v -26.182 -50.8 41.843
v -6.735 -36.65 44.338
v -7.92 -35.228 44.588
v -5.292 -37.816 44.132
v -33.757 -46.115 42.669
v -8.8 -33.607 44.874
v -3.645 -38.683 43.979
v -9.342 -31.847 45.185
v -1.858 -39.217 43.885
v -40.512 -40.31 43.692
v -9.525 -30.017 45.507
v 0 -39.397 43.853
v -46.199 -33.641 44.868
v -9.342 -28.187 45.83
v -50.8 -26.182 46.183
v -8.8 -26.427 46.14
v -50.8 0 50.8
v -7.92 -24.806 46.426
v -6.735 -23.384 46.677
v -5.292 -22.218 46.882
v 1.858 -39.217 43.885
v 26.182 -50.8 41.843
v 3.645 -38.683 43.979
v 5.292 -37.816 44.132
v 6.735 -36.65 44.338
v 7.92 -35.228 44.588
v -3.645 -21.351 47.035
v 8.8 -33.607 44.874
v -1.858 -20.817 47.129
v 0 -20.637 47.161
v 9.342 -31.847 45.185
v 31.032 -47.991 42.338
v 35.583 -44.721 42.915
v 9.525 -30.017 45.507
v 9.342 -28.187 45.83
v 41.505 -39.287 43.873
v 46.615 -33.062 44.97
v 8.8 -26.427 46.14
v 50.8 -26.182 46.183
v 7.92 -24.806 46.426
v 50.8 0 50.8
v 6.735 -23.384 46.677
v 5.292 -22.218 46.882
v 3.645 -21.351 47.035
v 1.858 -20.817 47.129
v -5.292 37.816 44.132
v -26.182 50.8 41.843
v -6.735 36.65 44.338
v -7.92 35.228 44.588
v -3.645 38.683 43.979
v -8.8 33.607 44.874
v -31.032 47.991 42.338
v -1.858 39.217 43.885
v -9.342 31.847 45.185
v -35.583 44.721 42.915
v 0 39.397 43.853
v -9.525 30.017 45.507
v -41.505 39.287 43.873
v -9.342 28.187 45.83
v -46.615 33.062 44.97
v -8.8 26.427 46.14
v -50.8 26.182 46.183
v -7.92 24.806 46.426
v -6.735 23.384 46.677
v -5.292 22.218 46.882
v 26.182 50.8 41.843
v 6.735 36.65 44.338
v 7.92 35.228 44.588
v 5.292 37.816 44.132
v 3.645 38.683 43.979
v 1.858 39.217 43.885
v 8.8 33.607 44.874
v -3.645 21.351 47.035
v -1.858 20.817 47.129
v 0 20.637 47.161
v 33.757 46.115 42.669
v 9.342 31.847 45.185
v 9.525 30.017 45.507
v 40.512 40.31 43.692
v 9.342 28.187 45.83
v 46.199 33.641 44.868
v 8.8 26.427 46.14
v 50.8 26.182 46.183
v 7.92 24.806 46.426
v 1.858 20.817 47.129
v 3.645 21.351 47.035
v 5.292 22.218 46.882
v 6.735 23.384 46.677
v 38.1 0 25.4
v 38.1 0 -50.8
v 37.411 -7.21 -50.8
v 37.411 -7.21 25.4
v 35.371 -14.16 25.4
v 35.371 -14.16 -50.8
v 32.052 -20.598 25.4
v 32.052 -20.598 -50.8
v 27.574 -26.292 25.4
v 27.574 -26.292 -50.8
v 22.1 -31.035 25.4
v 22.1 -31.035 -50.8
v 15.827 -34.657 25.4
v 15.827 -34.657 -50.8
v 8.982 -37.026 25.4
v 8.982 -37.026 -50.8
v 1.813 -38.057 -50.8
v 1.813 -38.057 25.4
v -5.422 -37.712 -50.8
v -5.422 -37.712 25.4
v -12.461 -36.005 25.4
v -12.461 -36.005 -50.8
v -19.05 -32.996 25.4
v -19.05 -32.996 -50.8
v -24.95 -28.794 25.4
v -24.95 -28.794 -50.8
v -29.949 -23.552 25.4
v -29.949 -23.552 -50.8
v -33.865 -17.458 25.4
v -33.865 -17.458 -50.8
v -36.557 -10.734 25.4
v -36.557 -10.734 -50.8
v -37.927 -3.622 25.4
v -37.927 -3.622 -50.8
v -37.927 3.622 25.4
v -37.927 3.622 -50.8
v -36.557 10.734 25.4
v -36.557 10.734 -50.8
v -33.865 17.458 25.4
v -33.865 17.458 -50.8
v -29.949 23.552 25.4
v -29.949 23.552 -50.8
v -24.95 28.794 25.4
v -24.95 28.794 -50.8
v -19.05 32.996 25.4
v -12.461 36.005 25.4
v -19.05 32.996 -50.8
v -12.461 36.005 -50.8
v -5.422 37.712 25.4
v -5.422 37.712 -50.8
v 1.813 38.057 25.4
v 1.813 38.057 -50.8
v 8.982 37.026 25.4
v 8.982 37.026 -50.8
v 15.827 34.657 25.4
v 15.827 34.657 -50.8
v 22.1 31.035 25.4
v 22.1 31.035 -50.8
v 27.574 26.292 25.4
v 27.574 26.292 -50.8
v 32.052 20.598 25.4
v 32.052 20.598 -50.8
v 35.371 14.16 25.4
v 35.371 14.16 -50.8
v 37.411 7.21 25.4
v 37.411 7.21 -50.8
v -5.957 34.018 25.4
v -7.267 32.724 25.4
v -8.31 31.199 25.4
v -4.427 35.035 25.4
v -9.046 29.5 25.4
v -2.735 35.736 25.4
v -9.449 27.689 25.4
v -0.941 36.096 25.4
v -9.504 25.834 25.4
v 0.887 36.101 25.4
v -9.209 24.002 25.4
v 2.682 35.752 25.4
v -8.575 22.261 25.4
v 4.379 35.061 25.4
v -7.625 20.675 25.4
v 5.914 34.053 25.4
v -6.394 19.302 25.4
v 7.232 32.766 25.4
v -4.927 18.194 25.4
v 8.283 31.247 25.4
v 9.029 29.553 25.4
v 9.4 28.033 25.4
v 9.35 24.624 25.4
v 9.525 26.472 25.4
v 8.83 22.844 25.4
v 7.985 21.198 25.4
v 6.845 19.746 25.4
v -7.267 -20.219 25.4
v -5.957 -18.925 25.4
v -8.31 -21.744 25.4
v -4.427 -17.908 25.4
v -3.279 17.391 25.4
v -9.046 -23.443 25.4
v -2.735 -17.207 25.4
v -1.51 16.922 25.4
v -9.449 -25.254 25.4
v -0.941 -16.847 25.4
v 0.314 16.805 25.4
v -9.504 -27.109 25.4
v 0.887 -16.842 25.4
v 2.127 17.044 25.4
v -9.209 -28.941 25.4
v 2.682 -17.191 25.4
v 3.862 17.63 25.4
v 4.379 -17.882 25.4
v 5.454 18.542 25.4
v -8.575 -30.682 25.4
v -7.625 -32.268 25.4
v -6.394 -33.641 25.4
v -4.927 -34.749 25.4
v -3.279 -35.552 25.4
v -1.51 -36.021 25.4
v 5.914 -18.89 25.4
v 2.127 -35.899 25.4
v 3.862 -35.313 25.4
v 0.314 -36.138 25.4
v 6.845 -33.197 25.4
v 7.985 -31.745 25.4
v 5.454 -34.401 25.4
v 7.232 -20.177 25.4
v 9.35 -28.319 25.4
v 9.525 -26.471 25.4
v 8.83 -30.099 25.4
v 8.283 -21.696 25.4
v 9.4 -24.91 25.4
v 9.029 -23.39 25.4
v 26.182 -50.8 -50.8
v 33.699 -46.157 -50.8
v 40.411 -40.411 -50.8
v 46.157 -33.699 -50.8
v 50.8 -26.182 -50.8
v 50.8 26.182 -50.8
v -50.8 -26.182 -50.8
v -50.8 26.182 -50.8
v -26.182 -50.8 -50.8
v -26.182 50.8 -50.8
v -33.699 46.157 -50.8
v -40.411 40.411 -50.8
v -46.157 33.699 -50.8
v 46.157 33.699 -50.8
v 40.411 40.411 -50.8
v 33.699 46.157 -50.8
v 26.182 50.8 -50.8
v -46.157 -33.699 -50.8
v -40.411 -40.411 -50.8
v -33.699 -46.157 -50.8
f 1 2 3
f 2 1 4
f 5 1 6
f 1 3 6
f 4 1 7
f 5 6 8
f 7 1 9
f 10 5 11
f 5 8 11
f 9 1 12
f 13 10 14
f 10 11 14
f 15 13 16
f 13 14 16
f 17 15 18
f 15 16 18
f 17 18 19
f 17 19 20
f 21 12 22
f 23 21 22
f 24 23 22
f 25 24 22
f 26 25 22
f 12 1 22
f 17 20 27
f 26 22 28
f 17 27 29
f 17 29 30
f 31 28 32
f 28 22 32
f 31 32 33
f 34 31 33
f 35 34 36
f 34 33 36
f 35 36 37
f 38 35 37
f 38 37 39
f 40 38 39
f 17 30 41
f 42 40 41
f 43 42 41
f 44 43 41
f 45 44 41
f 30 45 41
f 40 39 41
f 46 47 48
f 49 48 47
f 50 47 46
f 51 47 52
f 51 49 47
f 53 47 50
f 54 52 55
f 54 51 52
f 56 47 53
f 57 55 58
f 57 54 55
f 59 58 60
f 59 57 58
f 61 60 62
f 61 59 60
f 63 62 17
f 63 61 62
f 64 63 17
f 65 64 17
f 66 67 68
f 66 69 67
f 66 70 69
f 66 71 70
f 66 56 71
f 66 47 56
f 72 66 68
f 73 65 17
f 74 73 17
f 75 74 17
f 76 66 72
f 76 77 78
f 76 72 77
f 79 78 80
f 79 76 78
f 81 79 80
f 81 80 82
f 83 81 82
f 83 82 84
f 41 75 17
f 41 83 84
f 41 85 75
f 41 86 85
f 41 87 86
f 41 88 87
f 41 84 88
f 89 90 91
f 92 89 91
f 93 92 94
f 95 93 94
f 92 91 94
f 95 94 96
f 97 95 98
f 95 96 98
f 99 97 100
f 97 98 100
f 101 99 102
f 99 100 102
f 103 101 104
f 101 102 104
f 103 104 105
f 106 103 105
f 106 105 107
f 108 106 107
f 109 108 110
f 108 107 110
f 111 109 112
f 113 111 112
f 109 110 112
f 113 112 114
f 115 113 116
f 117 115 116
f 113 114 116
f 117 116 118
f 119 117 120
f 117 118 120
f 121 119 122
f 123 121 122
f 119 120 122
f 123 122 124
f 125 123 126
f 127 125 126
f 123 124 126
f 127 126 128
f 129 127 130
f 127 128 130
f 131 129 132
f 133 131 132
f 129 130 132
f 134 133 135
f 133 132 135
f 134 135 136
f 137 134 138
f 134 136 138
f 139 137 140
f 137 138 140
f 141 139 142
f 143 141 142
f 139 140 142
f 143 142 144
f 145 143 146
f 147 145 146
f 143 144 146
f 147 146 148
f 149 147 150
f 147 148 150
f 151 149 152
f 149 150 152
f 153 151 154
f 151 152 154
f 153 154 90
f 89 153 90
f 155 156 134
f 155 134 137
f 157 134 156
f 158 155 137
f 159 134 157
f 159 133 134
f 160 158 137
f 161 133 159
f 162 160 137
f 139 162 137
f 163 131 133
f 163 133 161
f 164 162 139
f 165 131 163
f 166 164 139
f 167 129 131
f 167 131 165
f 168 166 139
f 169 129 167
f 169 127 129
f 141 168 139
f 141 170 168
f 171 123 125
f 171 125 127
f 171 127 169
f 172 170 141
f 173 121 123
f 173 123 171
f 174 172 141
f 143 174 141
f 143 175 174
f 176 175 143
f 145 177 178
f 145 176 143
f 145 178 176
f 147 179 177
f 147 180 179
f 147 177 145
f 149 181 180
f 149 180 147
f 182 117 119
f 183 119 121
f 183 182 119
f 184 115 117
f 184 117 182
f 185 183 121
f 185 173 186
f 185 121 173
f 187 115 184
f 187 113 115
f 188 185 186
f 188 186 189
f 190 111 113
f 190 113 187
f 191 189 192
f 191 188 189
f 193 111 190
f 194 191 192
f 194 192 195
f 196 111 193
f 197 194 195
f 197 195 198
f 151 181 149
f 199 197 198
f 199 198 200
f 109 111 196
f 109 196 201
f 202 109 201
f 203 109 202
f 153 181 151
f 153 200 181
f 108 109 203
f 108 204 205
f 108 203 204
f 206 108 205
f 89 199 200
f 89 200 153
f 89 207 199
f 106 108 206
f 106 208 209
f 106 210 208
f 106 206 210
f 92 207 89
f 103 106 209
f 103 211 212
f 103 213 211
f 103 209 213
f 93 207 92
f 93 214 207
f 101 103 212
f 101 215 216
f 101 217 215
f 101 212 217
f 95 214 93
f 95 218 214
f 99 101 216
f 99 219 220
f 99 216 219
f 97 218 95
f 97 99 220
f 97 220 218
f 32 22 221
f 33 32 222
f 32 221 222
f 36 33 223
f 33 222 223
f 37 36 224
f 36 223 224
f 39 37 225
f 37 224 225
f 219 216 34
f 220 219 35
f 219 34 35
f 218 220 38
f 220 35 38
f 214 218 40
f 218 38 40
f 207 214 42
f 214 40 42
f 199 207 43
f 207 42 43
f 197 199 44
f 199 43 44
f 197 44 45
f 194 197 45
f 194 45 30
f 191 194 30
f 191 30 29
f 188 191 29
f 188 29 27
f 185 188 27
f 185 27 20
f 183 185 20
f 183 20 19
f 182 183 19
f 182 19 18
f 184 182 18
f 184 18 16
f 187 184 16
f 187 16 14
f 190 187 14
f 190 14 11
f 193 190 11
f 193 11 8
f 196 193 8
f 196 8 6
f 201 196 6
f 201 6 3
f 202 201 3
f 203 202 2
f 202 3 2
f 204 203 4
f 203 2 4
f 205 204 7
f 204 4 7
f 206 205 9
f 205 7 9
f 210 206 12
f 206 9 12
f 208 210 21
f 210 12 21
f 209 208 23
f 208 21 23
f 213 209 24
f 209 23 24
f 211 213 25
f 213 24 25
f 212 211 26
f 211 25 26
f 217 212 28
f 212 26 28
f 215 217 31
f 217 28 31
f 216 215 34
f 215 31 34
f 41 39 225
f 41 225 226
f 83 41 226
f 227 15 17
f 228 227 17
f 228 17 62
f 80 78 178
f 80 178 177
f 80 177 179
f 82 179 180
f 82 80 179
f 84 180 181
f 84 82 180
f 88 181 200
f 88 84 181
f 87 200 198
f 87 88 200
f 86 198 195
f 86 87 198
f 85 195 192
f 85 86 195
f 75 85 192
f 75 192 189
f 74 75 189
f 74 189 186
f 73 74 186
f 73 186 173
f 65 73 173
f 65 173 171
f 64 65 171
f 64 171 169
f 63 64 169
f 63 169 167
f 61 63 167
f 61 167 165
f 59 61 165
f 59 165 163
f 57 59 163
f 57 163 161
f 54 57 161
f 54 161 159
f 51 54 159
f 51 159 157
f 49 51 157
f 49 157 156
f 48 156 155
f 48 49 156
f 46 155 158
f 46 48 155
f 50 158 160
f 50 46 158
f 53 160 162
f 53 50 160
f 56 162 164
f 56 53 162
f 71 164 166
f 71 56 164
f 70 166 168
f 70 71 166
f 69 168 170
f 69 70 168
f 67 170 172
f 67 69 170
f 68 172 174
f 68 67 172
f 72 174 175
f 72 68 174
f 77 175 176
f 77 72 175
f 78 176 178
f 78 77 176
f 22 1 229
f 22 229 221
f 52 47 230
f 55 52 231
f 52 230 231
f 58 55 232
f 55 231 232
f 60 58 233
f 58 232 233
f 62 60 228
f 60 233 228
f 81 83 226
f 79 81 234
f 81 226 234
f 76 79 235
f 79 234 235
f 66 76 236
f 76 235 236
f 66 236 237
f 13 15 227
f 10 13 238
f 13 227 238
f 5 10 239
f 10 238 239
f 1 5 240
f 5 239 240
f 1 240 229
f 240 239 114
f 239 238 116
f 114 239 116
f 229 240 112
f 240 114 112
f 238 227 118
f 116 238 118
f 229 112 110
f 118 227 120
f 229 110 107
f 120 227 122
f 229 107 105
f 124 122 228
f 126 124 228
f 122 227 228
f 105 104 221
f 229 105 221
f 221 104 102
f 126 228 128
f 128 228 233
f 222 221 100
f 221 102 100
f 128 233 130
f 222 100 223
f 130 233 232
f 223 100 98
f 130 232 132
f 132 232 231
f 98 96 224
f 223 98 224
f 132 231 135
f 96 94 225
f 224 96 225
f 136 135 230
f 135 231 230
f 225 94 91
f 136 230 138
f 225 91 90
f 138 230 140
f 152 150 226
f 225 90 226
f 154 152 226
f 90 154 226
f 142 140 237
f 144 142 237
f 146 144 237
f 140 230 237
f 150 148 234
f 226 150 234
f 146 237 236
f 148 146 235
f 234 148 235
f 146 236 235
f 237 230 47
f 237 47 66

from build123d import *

# Parameters (mm, degrees)
F0_W     = 101.6
F0_H     = 101.6
F1_DEPTH = 50.8
F2_R     = 38.1
F3_DEPTH = 76.2
F5_DEPTH = 50.8
F6_R     = 9.525
F7_DEPTH = 25.4
F9_DEPTH = 127


# Not quite as in the source:
# - a pattern or mirror of a feature is missing from the dataset's text; its kind, count and spacing are read off the source's solid


with BuildPart() as f1:
    # F0 (on Top) → F1 (new body, symmetric)
    with BuildSketch(Plane.XY):
        Rectangle(F0_W, F0_H)
    extrude(amount=F1_DEPTH, both=True)

    # F2 (on face) → F3 (cut)
    with BuildSketch(Plane(origin=(0, 0, -50.8), x_dir=(1, 0, 0), z_dir=(0, 0, -1))):
        Circle(F2_R)
    extrude(amount=-F3_DEPTH, mode=Mode.SUBTRACT)

    # F4 (on Right) → F5 (cut, symmetric)
    with BuildSketch(Plane.YZ):
        Polygon((-50.8, 41.84258938), (0, 50.8), (-50.8, 50.8), align=None)
    f5 = extrude(amount=F5_DEPTH, both=True, mode=Mode.SUBTRACT)

    # F5_copies: F5 across plane
    add(f5.mirror(Plane.ZX), mode=Mode.SUBTRACT)

    # F6 (on face) → F7 (cut)
    with BuildSketch(Plane(origin=(0, -8.6873116405, 49.268192568), x_dir=(1, 0, 0), z_dir=(0, -0.1736481777, 0.984807753))):
        with Locations((0, -21.6586725745)):
            Circle(F6_R)
    f7 = extrude(amount=-F7_DEPTH, mode=Mode.SUBTRACT)

    # F7_copies: F7 across plane
    add(f7.mirror(Plane.ZX.offset(5e-06)), mode=Mode.SUBTRACT)

    # F8 (on face) → F9 (cut)
    with BuildSketch(Plane(origin=(0, 0, -50.8), x_dir=(1, 0, 0), z_dir=(0, 0, -1))):
        with BuildLine():
            ThreePointArc((26.1817207227, 50.8), (40.4111525448, 40.4111525448), (50.8, 26.1817207227))
            Line((50.8, 26.1817207227), (50.8, 50.8))
            Line((50.8, 50.8), (26.1817207227, 50.8))
        make_face()
        with BuildLine():
            Line((50.8, -50.8), (50.8, -26.1817207227))
            ThreePointArc((50.8, -26.1817207227), (40.4111525448, -40.4111525448), (26.1817207227, -50.8))
            Line((26.1817207227, -50.8), (50.8, -50.8))
        make_face()
        with BuildLine():
            Line((-26.1817207227, 50.8), (26.1817207227, 50.8))
            ThreePointArc((26.1817207227, 50.8), (0, 57.15), (-26.1817207227, 50.8))
        make_face()
        with BuildLine():
            ThreePointArc((-50.8, 26.1817207227), (-40.4111525448, 40.4111525448), (-26.1817207227, 50.8))
            Line((-26.1817207227, 50.8), (-50.8, 50.8))
            Line((-50.8, 50.8), (-50.8, 26.1817207227))
        make_face()
        with BuildLine():
            Line((-50.8, -50.8), (-26.1817207227, -50.8))
            ThreePointArc((-26.1817207227, -50.8), (-40.4111525448, -40.4111525448), (-50.8, -26.1817207227))
            Line((-50.8, -26.1817207227), (-50.8, -50.8))
        make_face()
    extrude(amount=-F9_DEPTH, mode=Mode.SUBTRACT)


solid = f1.part
